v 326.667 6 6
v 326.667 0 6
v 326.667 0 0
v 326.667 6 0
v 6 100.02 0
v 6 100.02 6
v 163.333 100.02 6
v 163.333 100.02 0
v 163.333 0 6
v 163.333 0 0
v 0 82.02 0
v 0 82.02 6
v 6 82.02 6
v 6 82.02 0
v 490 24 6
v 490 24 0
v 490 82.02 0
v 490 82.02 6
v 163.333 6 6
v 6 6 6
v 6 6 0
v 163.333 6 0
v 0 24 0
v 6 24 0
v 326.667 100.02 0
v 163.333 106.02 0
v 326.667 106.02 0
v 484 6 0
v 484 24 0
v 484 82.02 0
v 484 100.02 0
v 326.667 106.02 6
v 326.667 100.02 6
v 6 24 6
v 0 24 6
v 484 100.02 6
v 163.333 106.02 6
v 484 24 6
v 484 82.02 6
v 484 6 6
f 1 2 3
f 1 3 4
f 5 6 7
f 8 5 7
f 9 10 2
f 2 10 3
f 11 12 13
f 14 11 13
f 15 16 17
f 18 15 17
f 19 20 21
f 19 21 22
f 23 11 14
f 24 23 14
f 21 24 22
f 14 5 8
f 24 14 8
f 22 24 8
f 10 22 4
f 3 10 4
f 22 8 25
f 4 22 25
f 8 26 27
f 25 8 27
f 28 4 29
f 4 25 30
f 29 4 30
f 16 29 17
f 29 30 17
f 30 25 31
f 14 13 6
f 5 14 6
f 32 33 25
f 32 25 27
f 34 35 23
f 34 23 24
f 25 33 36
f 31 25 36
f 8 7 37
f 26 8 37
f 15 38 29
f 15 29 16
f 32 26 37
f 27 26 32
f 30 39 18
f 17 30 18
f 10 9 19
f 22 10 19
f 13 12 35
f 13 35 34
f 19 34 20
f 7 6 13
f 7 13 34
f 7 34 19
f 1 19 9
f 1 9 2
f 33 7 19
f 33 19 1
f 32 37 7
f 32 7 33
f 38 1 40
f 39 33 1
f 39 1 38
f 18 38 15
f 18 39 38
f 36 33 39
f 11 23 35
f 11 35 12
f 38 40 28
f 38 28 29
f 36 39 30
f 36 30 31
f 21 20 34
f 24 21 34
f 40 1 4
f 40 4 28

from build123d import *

# Parameters (mm, degrees)
SKETCH1_W           = 490
SKETCH1_H           = 106.02
BOSS_EXTRUDE1_DEPTH = 6
SKETCH2_W           = 6
SKETCH2_H           = 24
CUT_EXTRUDE1_DEPTH  = 502.374351558
SKETCH3_W           = 157.333333333
SKETCH3_H           = 6
CUT_EXTRUDE2_DEPTH  = 502.374351558


with BuildPart() as part:
    # Sketch1 → Boss-Extrude1 (new body)
    with BuildSketch(Plane.XY):
        with Locations((245, 53.01)):
            Rectangle(SKETCH1_W, SKETCH1_H)
    extrude(amount=BOSS_EXTRUDE1_DEPTH)

    # Sketch2 → Cut-Extrude1 (cut, through all)
    with BuildSketch(Plane.XY.offset(6)):
        with Locations((487, 12)):
            Rectangle(SKETCH2_W, SKETCH2_H)
        with Locations((487, 94.02)):
            Rectangle(SKETCH2_W, SKETCH2_H)
        with Locations((3, 94.02)):
            Rectangle(SKETCH2_W, SKETCH2_H)
        with Locations((3, 12)):
            Rectangle(SKETCH2_W, SKETCH2_H)
    extrude(amount=-CUT_EXTRUDE1_DEPTH, mode=Mode.SUBTRACT)

    # Sketch3 → Cut-Extrude2 (cut, through all)
    with BuildSketch(Plane.XY.offset(6)):
        with Locations((84.666666667, 3)):
            Rectangle(SKETCH3_W, SKETCH3_H)
        with Locations((405.333333334, 3)):
            Rectangle(SKETCH3_W, SKETCH3_H)
        with Locations((84.666666667, 103.02)):
            Rectangle(SKETCH3_W, SKETCH3_H)
        with Locations((405.333333334, 103.02)):
            Rectangle(SKETCH3_W, SKETCH3_H)
    extrude(amount=-CUT_EXTRUDE2_DEPTH, mode=Mode.SUBTRACT)


solid = part.part
